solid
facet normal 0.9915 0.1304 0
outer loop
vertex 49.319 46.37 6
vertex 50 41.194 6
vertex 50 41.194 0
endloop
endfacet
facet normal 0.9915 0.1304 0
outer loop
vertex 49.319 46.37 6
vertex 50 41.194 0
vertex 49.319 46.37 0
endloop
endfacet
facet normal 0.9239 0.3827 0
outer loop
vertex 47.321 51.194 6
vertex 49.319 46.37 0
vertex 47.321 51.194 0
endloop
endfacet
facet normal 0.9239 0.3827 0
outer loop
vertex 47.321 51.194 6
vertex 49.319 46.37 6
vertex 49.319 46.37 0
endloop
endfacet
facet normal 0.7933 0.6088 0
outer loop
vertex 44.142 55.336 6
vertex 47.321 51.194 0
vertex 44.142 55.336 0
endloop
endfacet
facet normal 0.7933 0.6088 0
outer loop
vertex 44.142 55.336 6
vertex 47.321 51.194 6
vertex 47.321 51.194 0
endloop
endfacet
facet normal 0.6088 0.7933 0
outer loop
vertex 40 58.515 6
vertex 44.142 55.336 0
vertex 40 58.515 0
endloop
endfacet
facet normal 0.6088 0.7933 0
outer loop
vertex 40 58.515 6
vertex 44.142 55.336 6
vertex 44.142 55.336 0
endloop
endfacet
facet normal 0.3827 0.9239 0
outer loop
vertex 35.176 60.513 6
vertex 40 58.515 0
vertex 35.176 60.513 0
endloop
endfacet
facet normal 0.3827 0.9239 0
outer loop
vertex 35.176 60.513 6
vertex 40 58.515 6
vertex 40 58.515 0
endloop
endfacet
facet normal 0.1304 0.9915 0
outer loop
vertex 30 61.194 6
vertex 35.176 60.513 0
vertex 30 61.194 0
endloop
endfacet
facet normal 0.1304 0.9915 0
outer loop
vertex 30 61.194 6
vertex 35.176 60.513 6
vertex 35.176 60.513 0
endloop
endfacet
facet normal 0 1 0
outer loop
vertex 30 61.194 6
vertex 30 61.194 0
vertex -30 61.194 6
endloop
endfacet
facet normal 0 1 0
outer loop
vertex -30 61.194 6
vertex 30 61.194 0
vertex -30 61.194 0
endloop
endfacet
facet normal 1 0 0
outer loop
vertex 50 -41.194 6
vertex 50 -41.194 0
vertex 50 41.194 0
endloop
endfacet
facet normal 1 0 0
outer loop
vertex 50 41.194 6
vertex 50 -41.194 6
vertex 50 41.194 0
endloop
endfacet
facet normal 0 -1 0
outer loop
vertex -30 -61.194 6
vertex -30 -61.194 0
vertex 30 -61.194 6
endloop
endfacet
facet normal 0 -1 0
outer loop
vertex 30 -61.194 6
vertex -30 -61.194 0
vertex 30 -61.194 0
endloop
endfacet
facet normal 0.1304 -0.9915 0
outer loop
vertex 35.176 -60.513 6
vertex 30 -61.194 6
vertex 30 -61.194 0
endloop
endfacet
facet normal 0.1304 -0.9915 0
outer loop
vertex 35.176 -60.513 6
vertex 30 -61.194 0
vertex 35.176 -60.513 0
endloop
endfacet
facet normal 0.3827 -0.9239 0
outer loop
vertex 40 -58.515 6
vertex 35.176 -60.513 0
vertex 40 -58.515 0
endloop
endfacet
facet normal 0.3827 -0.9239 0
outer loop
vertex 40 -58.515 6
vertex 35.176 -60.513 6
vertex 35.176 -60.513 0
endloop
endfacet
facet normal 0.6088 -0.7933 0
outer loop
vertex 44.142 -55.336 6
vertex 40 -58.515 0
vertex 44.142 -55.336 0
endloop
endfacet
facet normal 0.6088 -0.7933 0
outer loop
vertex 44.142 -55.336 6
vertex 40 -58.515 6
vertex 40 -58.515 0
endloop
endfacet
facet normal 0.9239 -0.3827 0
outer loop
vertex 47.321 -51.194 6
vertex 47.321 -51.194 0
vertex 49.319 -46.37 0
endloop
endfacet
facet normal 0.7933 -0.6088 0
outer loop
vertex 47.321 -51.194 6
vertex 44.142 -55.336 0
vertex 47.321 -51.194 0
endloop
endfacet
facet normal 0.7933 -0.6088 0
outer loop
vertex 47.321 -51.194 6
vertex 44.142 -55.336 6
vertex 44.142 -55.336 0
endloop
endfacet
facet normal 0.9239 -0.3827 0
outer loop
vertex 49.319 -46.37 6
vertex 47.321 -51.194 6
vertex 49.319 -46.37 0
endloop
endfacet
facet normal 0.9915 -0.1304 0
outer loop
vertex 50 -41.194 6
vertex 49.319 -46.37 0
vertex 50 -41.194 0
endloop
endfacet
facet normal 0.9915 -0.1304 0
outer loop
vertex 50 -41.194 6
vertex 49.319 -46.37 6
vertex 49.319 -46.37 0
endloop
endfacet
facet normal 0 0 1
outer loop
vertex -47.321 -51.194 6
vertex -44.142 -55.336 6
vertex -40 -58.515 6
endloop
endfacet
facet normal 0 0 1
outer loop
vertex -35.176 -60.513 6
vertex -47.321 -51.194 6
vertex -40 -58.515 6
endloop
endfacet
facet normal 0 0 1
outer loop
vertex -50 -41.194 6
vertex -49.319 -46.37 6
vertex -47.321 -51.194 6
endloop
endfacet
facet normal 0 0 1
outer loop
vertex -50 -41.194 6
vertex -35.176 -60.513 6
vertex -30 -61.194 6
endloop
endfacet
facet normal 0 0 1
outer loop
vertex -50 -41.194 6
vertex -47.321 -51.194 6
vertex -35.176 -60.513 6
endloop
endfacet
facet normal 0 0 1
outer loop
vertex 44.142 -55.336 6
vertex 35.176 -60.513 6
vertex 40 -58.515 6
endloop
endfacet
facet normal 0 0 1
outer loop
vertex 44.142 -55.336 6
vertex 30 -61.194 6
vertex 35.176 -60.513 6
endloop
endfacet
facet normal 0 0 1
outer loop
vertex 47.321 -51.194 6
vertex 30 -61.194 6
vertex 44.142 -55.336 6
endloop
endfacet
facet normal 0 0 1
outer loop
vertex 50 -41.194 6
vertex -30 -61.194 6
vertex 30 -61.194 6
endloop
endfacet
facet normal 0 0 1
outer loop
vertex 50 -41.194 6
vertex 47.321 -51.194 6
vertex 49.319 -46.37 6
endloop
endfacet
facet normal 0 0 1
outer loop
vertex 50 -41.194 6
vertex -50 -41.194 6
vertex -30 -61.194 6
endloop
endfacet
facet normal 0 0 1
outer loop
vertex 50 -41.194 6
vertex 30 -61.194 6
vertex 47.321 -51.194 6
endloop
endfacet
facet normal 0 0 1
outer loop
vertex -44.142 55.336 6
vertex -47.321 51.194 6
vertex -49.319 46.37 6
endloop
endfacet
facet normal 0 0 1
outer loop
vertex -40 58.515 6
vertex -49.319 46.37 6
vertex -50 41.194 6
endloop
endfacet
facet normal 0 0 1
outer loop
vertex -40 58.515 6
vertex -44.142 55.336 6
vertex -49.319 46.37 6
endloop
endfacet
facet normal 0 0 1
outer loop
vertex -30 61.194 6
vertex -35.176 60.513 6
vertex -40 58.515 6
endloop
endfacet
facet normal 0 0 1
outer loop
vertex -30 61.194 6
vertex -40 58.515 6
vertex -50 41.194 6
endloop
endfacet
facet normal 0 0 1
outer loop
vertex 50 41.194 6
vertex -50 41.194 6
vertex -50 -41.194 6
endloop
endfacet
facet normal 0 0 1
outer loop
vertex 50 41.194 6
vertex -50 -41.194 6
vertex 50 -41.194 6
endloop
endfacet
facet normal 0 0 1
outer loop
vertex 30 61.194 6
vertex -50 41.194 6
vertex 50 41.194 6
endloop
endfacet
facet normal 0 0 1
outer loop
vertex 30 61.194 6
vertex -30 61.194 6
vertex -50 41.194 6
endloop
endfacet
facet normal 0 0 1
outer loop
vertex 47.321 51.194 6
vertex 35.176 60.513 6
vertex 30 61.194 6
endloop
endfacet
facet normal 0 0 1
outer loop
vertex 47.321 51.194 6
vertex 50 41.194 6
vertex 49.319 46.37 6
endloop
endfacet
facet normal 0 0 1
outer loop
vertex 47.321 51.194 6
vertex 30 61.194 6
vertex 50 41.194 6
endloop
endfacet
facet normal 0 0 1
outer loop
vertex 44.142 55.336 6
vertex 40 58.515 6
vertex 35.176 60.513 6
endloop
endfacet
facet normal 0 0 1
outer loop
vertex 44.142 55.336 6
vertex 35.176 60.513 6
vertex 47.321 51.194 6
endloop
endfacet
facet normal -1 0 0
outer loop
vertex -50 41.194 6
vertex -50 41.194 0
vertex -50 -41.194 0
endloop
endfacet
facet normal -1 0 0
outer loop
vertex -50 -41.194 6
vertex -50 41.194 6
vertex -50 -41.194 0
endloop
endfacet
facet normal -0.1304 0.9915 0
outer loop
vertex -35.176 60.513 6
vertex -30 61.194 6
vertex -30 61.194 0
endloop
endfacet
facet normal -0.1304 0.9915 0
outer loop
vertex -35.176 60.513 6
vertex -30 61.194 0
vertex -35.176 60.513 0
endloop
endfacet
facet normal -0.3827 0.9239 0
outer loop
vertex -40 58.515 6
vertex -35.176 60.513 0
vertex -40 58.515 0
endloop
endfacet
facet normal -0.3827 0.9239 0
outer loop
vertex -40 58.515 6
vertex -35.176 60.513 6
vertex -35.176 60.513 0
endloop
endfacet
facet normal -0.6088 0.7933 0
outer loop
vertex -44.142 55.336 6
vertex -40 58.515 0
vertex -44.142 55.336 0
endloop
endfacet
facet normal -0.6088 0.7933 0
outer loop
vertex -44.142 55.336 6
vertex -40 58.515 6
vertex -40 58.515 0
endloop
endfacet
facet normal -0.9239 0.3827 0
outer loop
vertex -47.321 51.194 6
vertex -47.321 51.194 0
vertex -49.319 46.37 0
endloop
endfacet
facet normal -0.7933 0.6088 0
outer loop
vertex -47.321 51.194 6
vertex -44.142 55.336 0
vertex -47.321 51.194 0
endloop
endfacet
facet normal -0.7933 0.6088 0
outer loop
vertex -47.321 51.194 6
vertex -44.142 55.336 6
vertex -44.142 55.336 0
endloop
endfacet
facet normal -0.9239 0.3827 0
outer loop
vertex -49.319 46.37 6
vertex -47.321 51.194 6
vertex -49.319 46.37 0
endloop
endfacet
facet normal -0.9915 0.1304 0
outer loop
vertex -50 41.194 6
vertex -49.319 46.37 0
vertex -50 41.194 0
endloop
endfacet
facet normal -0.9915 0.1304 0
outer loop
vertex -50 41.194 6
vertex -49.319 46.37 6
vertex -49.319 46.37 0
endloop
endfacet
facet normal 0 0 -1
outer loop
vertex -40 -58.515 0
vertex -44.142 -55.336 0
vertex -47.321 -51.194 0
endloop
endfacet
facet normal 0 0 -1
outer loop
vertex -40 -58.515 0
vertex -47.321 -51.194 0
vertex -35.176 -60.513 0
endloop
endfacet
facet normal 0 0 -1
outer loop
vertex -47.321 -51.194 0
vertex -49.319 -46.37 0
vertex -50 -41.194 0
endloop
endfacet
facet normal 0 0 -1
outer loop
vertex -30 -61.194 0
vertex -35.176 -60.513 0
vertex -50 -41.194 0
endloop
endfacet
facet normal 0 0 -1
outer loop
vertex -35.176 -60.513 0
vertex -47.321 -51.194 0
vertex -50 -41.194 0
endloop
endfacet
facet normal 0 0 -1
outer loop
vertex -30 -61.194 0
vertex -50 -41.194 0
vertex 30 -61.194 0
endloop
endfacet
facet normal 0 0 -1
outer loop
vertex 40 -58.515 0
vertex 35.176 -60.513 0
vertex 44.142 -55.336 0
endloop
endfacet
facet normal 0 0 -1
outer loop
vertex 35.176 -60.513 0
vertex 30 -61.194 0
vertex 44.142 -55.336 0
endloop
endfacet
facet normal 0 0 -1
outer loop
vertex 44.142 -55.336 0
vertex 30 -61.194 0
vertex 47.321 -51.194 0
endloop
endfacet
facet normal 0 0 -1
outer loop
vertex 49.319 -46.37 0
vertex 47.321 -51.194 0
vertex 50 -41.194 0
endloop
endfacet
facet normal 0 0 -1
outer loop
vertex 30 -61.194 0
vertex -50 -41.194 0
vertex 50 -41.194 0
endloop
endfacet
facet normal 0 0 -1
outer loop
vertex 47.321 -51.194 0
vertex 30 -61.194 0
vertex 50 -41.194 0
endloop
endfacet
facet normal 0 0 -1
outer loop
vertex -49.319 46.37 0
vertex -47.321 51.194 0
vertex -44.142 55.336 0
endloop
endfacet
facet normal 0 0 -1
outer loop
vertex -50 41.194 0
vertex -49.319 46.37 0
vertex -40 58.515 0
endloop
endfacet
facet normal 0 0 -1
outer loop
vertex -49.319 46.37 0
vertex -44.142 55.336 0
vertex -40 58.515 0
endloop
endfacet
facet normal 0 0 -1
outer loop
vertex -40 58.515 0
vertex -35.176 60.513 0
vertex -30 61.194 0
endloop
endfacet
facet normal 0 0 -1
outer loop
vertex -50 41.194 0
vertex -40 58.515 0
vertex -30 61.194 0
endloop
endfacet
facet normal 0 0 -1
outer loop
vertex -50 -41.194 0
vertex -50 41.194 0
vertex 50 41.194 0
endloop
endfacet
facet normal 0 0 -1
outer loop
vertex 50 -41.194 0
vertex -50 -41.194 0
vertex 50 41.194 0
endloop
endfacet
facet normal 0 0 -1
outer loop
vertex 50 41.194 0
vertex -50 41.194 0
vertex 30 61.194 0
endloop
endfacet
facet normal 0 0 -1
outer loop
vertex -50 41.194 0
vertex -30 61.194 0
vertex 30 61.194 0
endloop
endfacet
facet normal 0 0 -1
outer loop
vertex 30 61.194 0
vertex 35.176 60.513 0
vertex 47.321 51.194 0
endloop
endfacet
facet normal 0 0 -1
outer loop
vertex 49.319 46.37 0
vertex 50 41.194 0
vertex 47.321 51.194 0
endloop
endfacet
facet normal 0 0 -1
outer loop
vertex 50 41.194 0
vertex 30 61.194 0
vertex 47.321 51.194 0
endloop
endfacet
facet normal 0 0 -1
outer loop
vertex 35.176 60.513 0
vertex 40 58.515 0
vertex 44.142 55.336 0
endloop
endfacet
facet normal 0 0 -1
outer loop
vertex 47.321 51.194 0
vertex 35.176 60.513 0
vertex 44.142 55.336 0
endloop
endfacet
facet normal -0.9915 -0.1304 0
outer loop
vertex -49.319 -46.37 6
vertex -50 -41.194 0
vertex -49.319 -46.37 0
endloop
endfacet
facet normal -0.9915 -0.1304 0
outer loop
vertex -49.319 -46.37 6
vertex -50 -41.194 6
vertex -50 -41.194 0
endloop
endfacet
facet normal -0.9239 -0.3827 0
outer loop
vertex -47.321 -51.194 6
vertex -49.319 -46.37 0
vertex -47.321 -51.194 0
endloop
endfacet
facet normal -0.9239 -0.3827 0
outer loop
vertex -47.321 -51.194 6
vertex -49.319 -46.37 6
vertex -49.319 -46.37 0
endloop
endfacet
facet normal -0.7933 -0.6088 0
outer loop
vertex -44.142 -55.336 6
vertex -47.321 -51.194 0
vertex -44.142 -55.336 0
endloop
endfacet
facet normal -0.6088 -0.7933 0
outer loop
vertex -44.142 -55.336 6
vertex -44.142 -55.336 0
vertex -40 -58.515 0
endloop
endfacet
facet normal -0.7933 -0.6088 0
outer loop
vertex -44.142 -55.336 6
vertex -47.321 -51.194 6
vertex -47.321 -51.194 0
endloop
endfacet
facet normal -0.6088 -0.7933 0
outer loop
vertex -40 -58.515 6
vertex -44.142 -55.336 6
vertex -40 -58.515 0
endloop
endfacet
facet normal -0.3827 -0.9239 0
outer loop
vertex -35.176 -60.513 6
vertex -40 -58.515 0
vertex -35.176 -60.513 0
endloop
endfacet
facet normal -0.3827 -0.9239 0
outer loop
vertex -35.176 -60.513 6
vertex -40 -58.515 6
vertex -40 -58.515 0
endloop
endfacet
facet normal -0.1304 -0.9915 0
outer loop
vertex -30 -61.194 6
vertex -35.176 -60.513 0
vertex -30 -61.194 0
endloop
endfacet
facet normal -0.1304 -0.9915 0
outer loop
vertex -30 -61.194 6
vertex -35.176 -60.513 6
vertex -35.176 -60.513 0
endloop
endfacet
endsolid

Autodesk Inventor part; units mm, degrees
ref_plane "YZ Plane" through (0, 0, 0) normal (1, 0, 0) x (0, 1, 0)
ref_plane "XZ Plane" through (0, 0, 0) normal (0, 1, 0) x (-1, 0, 0)
ref_plane "XY Plane" through (0, 0, 0) normal (0, 0, 1) x (1, 0, 0)
sketch "Sketch1" plane through (0, 0, 0) normal (0, 0, 1) x (1, 0, 0)
  line L0 (-50, -61.1941) -> (50, -61.1941)
  line L1 (50, -61.1941) -> (50, 61.1941)
  line L2 (50, 61.1941) -> (-50, 61.1941)
  line L3 (-50, 61.1941) -> (-50, -61.1941)
  line L4 (-50, -61.1941) -> (50, 61.1941) construction
  line L5 (50, -61.1941) -> (-50, 61.1941) construction
  point P0 (0, 0)
  dimension "d0" = 100
  dimension "d1" = 122.3883
extrude "Plate1" add sketch "Sketch1" along normal blind 6
fillet "Corner Round1" radius 20 4 edges at (50, -61.1941, 3) (-50, -61.1941, 3) (-50, 61.1941, 3) (50, 61.1941, 3)
sketch "Sketch5" plane through (0, 0, 6) normal (0, 0, 1) x (1, 0, 0)
  line L0 (50, 41.1941) -> (50, -41.1941) projected
  line L1 (50, 31.1941) -> (-50, 31.1941)
  line L2 (-50, -41.1941) -> (-50, 41.1941) projected
  line L3 (-30, 61.1941) -> (30, 61.1941) projected
  point P0 (0, 0)
  dimension "d23" = 30
feature "Fold1" [suppressed]
equation "\"d1\" = Legs_Upper_plate_lenght"
equation "\"d2\" = Thickness"
equation "\"d24\" = BendReliefWidth"
equation "\"d25\" = BendReliefDepth"
equation "\"d26\" = MinimumRemnant"
equation "\"d27\" = TransitionRadius"
equation "\"d29\" = BendRadius"
equation "\"BendReliefWidth\" = Thickness"
equation "\"BendReliefDepth\" = 0.5 * Thickness"
equation "\"CornerReliefSize\" = 4 * Thickness"
equation "\"MinimumRemnant\" = 2 * Thickness"
equation "\"TransitionRadius\" = BendRadius"
equation "\"JacobiRadiusSize\" = BendRadius"
equation "\"GapSize\" = Thickness"
equation "\"Legs_Upper_plate_lenght\" = 122.388269"
equation "\"Thickness\" = 6"
equation "\"BendRadius\" = 5"
properties part number "PRS 9694 leg plate for filter_D1200" material "Stainless Steel"
